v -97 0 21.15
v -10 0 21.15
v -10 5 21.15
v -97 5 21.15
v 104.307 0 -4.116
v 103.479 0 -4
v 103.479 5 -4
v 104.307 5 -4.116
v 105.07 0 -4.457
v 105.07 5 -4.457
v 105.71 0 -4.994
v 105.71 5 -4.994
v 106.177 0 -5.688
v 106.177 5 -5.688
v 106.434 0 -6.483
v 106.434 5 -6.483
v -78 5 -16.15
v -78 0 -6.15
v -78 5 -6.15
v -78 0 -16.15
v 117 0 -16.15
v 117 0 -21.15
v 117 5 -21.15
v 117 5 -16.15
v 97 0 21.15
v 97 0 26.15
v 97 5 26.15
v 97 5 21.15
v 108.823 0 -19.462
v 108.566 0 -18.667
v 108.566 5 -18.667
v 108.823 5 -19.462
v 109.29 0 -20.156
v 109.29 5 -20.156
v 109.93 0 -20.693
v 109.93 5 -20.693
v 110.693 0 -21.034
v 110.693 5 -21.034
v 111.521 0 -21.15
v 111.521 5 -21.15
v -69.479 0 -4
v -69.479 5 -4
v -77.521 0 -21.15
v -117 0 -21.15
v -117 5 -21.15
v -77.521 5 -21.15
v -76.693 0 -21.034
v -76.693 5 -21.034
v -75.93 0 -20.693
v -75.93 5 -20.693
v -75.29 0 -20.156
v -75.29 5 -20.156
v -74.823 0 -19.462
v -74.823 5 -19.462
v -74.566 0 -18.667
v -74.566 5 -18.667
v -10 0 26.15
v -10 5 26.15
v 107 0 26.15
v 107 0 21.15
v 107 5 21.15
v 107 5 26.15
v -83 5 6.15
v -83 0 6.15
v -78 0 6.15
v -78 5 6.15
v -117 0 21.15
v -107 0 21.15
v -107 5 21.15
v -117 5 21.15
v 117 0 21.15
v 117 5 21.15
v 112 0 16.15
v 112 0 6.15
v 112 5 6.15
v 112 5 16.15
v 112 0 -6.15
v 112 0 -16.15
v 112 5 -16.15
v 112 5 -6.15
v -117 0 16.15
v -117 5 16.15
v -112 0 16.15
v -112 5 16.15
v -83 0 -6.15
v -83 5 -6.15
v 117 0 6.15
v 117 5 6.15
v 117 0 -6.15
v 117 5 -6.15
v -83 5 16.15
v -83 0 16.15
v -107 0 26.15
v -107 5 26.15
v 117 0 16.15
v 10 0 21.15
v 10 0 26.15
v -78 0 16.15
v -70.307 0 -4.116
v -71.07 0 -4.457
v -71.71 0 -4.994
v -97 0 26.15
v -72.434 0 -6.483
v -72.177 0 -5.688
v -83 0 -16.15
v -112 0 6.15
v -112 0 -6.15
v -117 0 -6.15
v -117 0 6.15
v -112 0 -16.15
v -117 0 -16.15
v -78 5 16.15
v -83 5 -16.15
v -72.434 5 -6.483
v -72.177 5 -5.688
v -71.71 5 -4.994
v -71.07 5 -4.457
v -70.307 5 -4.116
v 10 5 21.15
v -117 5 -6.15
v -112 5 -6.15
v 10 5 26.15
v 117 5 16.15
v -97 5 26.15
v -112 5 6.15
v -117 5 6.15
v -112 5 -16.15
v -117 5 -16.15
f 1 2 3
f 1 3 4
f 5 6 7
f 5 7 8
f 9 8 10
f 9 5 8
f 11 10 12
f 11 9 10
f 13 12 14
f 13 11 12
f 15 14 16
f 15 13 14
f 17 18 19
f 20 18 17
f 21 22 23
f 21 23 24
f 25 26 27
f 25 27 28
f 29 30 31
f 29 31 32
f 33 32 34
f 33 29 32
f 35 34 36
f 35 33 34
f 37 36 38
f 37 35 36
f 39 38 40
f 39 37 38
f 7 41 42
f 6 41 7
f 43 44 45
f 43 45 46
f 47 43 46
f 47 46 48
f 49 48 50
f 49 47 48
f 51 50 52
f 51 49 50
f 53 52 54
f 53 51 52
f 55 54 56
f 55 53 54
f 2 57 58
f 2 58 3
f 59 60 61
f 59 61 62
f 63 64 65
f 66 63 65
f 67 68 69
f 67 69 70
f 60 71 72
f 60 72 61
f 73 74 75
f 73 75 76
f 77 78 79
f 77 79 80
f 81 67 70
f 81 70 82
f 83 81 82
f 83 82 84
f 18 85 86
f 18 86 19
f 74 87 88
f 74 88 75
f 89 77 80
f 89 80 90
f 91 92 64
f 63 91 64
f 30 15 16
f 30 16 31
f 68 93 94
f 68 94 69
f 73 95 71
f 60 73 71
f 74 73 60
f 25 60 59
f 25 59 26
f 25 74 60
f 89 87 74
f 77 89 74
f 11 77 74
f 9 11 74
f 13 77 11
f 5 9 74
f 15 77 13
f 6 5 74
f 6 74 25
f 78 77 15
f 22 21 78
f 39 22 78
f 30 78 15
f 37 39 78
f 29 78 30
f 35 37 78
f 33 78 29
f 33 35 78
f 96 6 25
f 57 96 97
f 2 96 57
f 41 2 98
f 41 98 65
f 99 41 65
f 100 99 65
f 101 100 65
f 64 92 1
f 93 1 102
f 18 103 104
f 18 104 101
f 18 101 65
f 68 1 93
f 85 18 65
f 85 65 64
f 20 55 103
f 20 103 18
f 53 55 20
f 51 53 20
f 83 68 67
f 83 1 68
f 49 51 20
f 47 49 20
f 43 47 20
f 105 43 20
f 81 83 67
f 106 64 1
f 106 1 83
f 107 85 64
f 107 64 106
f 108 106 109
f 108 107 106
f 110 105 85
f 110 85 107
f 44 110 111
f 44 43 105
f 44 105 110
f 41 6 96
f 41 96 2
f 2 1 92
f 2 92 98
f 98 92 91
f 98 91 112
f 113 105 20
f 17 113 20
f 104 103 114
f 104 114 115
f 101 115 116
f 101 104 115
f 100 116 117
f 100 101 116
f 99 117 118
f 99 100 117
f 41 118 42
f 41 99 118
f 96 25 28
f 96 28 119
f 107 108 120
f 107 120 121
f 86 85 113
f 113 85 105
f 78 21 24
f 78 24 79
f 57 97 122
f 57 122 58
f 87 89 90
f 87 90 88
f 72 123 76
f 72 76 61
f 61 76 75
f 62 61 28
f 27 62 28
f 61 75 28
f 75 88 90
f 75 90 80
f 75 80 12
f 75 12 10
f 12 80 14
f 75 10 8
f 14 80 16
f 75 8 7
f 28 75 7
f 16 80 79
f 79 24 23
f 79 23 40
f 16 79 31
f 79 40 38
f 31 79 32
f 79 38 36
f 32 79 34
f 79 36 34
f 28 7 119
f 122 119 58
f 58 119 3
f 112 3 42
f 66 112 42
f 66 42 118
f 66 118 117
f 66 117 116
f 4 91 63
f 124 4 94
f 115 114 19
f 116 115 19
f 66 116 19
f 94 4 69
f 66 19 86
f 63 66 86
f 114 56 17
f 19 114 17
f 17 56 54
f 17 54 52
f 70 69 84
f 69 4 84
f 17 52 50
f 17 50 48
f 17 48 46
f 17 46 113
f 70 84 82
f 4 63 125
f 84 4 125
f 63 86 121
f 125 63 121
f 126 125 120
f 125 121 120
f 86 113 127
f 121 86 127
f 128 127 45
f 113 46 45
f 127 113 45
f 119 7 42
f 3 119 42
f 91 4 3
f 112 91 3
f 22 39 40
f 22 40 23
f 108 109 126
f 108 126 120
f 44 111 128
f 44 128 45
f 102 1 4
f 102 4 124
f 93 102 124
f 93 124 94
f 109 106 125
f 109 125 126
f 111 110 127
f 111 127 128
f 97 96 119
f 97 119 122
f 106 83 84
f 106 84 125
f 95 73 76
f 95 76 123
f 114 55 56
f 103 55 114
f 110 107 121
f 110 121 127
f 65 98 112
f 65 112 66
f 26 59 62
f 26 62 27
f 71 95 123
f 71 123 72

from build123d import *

# Parameters (mm, degrees)
SKETCH_1_W      = 5
SKETCH_1_H      = 10
EXTRUDE_1_DEPTH = 5


with BuildPart() as part:
    # 草图1 → 凸台-拉伸1 (new body)
    with BuildSketch(Plane(origin=(0, 0, 0), x_dir=(1, 0, 0), z_dir=(0, 1, 0))):
        with BuildLine():
            Line((-117, 21.15), (-77.52077205, 21.15))
            ThreePointArc((-77.52077205, 21.15), (-75.590849256, 20.446823461), (-74.565644083, 18.666932006))
            Line((-74.565644083, 18.666932006), (-72.434355917, 6.483067994))
            ThreePointArc((-72.434355917, 6.483067994), (-71.409150744, 4.703176539), (-69.47922795, 4))
            Line((-69.47922795, 4), (103.47922795, 4))
            ThreePointArc((103.47922795, 4), (105.409150744, 4.703176539), (106.434355917, 6.483067994))
            Line((106.434355917, 6.483067994), (108.565644083, 18.666932006))
            ThreePointArc((108.565644083, 18.666932006), (109.590849256, 20.446823461), (111.52077205, 21.15))
            Line((111.52077205, 21.15), (117, 21.15))
            Line((117, 21.15), (117, 16.15))
            Line((117, 16.15), (112, 16.15))
            Line((112, 16.15), (112, 6.15))
            Line((112, 6.15), (117, 6.15))
            Line((117, 6.15), (117, -6.15))
            Line((117, -6.15), (112, -6.15))
            Line((112, -6.15), (112, -16.15))
            Line((112, -16.15), (117, -16.15))
            Line((117, -16.15), (117, -21.15))
            Line((117, -21.15), (107, -21.15))
            Line((107, -21.15), (107, -26.15))
            Line((107, -26.15), (97, -26.15))
            Line((97, -26.15), (97, -21.15))
            Line((97, -21.15), (10, -21.15))
            Line((10, -21.15), (10, -26.15))
            Line((10, -26.15), (-10, -26.15))
            Line((-10, -26.15), (-10, -21.15))
            Line((-10, -21.15), (-97, -21.15))
            Line((-97, -21.15), (-97, -26.15))
            Line((-97, -26.15), (-107, -26.15))
            Line((-107, -26.15), (-107, -21.15))
            Line((-107, -21.15), (-117, -21.15))
            Line((-117, -21.15), (-117, -16.15))
            Line((-117, -16.15), (-112, -16.15))
            Line((-112, -16.15), (-112, -6.15))
            Line((-112, -6.15), (-117, -6.15))
            Line((-117, -6.15), (-117, 6.15))
            Line((-117, 6.15), (-112, 6.15))
            Line((-112, 6.15), (-112, 16.15))
            Line((-112, 16.15), (-117, 16.15))
            Line((-117, 16.15), (-117, 21.15))
        make_face()
        with Locations((-80.5, 11.15)):
            Rectangle(SKETCH_1_W, SKETCH_1_H, mode=Mode.SUBTRACT)
        with Locations((-80.5, -11.15)):
            Rectangle(SKETCH_1_W, SKETCH_1_H, mode=Mode.SUBTRACT)
    extrude(amount=EXTRUDE_1_DEPTH)


solid = part.part
